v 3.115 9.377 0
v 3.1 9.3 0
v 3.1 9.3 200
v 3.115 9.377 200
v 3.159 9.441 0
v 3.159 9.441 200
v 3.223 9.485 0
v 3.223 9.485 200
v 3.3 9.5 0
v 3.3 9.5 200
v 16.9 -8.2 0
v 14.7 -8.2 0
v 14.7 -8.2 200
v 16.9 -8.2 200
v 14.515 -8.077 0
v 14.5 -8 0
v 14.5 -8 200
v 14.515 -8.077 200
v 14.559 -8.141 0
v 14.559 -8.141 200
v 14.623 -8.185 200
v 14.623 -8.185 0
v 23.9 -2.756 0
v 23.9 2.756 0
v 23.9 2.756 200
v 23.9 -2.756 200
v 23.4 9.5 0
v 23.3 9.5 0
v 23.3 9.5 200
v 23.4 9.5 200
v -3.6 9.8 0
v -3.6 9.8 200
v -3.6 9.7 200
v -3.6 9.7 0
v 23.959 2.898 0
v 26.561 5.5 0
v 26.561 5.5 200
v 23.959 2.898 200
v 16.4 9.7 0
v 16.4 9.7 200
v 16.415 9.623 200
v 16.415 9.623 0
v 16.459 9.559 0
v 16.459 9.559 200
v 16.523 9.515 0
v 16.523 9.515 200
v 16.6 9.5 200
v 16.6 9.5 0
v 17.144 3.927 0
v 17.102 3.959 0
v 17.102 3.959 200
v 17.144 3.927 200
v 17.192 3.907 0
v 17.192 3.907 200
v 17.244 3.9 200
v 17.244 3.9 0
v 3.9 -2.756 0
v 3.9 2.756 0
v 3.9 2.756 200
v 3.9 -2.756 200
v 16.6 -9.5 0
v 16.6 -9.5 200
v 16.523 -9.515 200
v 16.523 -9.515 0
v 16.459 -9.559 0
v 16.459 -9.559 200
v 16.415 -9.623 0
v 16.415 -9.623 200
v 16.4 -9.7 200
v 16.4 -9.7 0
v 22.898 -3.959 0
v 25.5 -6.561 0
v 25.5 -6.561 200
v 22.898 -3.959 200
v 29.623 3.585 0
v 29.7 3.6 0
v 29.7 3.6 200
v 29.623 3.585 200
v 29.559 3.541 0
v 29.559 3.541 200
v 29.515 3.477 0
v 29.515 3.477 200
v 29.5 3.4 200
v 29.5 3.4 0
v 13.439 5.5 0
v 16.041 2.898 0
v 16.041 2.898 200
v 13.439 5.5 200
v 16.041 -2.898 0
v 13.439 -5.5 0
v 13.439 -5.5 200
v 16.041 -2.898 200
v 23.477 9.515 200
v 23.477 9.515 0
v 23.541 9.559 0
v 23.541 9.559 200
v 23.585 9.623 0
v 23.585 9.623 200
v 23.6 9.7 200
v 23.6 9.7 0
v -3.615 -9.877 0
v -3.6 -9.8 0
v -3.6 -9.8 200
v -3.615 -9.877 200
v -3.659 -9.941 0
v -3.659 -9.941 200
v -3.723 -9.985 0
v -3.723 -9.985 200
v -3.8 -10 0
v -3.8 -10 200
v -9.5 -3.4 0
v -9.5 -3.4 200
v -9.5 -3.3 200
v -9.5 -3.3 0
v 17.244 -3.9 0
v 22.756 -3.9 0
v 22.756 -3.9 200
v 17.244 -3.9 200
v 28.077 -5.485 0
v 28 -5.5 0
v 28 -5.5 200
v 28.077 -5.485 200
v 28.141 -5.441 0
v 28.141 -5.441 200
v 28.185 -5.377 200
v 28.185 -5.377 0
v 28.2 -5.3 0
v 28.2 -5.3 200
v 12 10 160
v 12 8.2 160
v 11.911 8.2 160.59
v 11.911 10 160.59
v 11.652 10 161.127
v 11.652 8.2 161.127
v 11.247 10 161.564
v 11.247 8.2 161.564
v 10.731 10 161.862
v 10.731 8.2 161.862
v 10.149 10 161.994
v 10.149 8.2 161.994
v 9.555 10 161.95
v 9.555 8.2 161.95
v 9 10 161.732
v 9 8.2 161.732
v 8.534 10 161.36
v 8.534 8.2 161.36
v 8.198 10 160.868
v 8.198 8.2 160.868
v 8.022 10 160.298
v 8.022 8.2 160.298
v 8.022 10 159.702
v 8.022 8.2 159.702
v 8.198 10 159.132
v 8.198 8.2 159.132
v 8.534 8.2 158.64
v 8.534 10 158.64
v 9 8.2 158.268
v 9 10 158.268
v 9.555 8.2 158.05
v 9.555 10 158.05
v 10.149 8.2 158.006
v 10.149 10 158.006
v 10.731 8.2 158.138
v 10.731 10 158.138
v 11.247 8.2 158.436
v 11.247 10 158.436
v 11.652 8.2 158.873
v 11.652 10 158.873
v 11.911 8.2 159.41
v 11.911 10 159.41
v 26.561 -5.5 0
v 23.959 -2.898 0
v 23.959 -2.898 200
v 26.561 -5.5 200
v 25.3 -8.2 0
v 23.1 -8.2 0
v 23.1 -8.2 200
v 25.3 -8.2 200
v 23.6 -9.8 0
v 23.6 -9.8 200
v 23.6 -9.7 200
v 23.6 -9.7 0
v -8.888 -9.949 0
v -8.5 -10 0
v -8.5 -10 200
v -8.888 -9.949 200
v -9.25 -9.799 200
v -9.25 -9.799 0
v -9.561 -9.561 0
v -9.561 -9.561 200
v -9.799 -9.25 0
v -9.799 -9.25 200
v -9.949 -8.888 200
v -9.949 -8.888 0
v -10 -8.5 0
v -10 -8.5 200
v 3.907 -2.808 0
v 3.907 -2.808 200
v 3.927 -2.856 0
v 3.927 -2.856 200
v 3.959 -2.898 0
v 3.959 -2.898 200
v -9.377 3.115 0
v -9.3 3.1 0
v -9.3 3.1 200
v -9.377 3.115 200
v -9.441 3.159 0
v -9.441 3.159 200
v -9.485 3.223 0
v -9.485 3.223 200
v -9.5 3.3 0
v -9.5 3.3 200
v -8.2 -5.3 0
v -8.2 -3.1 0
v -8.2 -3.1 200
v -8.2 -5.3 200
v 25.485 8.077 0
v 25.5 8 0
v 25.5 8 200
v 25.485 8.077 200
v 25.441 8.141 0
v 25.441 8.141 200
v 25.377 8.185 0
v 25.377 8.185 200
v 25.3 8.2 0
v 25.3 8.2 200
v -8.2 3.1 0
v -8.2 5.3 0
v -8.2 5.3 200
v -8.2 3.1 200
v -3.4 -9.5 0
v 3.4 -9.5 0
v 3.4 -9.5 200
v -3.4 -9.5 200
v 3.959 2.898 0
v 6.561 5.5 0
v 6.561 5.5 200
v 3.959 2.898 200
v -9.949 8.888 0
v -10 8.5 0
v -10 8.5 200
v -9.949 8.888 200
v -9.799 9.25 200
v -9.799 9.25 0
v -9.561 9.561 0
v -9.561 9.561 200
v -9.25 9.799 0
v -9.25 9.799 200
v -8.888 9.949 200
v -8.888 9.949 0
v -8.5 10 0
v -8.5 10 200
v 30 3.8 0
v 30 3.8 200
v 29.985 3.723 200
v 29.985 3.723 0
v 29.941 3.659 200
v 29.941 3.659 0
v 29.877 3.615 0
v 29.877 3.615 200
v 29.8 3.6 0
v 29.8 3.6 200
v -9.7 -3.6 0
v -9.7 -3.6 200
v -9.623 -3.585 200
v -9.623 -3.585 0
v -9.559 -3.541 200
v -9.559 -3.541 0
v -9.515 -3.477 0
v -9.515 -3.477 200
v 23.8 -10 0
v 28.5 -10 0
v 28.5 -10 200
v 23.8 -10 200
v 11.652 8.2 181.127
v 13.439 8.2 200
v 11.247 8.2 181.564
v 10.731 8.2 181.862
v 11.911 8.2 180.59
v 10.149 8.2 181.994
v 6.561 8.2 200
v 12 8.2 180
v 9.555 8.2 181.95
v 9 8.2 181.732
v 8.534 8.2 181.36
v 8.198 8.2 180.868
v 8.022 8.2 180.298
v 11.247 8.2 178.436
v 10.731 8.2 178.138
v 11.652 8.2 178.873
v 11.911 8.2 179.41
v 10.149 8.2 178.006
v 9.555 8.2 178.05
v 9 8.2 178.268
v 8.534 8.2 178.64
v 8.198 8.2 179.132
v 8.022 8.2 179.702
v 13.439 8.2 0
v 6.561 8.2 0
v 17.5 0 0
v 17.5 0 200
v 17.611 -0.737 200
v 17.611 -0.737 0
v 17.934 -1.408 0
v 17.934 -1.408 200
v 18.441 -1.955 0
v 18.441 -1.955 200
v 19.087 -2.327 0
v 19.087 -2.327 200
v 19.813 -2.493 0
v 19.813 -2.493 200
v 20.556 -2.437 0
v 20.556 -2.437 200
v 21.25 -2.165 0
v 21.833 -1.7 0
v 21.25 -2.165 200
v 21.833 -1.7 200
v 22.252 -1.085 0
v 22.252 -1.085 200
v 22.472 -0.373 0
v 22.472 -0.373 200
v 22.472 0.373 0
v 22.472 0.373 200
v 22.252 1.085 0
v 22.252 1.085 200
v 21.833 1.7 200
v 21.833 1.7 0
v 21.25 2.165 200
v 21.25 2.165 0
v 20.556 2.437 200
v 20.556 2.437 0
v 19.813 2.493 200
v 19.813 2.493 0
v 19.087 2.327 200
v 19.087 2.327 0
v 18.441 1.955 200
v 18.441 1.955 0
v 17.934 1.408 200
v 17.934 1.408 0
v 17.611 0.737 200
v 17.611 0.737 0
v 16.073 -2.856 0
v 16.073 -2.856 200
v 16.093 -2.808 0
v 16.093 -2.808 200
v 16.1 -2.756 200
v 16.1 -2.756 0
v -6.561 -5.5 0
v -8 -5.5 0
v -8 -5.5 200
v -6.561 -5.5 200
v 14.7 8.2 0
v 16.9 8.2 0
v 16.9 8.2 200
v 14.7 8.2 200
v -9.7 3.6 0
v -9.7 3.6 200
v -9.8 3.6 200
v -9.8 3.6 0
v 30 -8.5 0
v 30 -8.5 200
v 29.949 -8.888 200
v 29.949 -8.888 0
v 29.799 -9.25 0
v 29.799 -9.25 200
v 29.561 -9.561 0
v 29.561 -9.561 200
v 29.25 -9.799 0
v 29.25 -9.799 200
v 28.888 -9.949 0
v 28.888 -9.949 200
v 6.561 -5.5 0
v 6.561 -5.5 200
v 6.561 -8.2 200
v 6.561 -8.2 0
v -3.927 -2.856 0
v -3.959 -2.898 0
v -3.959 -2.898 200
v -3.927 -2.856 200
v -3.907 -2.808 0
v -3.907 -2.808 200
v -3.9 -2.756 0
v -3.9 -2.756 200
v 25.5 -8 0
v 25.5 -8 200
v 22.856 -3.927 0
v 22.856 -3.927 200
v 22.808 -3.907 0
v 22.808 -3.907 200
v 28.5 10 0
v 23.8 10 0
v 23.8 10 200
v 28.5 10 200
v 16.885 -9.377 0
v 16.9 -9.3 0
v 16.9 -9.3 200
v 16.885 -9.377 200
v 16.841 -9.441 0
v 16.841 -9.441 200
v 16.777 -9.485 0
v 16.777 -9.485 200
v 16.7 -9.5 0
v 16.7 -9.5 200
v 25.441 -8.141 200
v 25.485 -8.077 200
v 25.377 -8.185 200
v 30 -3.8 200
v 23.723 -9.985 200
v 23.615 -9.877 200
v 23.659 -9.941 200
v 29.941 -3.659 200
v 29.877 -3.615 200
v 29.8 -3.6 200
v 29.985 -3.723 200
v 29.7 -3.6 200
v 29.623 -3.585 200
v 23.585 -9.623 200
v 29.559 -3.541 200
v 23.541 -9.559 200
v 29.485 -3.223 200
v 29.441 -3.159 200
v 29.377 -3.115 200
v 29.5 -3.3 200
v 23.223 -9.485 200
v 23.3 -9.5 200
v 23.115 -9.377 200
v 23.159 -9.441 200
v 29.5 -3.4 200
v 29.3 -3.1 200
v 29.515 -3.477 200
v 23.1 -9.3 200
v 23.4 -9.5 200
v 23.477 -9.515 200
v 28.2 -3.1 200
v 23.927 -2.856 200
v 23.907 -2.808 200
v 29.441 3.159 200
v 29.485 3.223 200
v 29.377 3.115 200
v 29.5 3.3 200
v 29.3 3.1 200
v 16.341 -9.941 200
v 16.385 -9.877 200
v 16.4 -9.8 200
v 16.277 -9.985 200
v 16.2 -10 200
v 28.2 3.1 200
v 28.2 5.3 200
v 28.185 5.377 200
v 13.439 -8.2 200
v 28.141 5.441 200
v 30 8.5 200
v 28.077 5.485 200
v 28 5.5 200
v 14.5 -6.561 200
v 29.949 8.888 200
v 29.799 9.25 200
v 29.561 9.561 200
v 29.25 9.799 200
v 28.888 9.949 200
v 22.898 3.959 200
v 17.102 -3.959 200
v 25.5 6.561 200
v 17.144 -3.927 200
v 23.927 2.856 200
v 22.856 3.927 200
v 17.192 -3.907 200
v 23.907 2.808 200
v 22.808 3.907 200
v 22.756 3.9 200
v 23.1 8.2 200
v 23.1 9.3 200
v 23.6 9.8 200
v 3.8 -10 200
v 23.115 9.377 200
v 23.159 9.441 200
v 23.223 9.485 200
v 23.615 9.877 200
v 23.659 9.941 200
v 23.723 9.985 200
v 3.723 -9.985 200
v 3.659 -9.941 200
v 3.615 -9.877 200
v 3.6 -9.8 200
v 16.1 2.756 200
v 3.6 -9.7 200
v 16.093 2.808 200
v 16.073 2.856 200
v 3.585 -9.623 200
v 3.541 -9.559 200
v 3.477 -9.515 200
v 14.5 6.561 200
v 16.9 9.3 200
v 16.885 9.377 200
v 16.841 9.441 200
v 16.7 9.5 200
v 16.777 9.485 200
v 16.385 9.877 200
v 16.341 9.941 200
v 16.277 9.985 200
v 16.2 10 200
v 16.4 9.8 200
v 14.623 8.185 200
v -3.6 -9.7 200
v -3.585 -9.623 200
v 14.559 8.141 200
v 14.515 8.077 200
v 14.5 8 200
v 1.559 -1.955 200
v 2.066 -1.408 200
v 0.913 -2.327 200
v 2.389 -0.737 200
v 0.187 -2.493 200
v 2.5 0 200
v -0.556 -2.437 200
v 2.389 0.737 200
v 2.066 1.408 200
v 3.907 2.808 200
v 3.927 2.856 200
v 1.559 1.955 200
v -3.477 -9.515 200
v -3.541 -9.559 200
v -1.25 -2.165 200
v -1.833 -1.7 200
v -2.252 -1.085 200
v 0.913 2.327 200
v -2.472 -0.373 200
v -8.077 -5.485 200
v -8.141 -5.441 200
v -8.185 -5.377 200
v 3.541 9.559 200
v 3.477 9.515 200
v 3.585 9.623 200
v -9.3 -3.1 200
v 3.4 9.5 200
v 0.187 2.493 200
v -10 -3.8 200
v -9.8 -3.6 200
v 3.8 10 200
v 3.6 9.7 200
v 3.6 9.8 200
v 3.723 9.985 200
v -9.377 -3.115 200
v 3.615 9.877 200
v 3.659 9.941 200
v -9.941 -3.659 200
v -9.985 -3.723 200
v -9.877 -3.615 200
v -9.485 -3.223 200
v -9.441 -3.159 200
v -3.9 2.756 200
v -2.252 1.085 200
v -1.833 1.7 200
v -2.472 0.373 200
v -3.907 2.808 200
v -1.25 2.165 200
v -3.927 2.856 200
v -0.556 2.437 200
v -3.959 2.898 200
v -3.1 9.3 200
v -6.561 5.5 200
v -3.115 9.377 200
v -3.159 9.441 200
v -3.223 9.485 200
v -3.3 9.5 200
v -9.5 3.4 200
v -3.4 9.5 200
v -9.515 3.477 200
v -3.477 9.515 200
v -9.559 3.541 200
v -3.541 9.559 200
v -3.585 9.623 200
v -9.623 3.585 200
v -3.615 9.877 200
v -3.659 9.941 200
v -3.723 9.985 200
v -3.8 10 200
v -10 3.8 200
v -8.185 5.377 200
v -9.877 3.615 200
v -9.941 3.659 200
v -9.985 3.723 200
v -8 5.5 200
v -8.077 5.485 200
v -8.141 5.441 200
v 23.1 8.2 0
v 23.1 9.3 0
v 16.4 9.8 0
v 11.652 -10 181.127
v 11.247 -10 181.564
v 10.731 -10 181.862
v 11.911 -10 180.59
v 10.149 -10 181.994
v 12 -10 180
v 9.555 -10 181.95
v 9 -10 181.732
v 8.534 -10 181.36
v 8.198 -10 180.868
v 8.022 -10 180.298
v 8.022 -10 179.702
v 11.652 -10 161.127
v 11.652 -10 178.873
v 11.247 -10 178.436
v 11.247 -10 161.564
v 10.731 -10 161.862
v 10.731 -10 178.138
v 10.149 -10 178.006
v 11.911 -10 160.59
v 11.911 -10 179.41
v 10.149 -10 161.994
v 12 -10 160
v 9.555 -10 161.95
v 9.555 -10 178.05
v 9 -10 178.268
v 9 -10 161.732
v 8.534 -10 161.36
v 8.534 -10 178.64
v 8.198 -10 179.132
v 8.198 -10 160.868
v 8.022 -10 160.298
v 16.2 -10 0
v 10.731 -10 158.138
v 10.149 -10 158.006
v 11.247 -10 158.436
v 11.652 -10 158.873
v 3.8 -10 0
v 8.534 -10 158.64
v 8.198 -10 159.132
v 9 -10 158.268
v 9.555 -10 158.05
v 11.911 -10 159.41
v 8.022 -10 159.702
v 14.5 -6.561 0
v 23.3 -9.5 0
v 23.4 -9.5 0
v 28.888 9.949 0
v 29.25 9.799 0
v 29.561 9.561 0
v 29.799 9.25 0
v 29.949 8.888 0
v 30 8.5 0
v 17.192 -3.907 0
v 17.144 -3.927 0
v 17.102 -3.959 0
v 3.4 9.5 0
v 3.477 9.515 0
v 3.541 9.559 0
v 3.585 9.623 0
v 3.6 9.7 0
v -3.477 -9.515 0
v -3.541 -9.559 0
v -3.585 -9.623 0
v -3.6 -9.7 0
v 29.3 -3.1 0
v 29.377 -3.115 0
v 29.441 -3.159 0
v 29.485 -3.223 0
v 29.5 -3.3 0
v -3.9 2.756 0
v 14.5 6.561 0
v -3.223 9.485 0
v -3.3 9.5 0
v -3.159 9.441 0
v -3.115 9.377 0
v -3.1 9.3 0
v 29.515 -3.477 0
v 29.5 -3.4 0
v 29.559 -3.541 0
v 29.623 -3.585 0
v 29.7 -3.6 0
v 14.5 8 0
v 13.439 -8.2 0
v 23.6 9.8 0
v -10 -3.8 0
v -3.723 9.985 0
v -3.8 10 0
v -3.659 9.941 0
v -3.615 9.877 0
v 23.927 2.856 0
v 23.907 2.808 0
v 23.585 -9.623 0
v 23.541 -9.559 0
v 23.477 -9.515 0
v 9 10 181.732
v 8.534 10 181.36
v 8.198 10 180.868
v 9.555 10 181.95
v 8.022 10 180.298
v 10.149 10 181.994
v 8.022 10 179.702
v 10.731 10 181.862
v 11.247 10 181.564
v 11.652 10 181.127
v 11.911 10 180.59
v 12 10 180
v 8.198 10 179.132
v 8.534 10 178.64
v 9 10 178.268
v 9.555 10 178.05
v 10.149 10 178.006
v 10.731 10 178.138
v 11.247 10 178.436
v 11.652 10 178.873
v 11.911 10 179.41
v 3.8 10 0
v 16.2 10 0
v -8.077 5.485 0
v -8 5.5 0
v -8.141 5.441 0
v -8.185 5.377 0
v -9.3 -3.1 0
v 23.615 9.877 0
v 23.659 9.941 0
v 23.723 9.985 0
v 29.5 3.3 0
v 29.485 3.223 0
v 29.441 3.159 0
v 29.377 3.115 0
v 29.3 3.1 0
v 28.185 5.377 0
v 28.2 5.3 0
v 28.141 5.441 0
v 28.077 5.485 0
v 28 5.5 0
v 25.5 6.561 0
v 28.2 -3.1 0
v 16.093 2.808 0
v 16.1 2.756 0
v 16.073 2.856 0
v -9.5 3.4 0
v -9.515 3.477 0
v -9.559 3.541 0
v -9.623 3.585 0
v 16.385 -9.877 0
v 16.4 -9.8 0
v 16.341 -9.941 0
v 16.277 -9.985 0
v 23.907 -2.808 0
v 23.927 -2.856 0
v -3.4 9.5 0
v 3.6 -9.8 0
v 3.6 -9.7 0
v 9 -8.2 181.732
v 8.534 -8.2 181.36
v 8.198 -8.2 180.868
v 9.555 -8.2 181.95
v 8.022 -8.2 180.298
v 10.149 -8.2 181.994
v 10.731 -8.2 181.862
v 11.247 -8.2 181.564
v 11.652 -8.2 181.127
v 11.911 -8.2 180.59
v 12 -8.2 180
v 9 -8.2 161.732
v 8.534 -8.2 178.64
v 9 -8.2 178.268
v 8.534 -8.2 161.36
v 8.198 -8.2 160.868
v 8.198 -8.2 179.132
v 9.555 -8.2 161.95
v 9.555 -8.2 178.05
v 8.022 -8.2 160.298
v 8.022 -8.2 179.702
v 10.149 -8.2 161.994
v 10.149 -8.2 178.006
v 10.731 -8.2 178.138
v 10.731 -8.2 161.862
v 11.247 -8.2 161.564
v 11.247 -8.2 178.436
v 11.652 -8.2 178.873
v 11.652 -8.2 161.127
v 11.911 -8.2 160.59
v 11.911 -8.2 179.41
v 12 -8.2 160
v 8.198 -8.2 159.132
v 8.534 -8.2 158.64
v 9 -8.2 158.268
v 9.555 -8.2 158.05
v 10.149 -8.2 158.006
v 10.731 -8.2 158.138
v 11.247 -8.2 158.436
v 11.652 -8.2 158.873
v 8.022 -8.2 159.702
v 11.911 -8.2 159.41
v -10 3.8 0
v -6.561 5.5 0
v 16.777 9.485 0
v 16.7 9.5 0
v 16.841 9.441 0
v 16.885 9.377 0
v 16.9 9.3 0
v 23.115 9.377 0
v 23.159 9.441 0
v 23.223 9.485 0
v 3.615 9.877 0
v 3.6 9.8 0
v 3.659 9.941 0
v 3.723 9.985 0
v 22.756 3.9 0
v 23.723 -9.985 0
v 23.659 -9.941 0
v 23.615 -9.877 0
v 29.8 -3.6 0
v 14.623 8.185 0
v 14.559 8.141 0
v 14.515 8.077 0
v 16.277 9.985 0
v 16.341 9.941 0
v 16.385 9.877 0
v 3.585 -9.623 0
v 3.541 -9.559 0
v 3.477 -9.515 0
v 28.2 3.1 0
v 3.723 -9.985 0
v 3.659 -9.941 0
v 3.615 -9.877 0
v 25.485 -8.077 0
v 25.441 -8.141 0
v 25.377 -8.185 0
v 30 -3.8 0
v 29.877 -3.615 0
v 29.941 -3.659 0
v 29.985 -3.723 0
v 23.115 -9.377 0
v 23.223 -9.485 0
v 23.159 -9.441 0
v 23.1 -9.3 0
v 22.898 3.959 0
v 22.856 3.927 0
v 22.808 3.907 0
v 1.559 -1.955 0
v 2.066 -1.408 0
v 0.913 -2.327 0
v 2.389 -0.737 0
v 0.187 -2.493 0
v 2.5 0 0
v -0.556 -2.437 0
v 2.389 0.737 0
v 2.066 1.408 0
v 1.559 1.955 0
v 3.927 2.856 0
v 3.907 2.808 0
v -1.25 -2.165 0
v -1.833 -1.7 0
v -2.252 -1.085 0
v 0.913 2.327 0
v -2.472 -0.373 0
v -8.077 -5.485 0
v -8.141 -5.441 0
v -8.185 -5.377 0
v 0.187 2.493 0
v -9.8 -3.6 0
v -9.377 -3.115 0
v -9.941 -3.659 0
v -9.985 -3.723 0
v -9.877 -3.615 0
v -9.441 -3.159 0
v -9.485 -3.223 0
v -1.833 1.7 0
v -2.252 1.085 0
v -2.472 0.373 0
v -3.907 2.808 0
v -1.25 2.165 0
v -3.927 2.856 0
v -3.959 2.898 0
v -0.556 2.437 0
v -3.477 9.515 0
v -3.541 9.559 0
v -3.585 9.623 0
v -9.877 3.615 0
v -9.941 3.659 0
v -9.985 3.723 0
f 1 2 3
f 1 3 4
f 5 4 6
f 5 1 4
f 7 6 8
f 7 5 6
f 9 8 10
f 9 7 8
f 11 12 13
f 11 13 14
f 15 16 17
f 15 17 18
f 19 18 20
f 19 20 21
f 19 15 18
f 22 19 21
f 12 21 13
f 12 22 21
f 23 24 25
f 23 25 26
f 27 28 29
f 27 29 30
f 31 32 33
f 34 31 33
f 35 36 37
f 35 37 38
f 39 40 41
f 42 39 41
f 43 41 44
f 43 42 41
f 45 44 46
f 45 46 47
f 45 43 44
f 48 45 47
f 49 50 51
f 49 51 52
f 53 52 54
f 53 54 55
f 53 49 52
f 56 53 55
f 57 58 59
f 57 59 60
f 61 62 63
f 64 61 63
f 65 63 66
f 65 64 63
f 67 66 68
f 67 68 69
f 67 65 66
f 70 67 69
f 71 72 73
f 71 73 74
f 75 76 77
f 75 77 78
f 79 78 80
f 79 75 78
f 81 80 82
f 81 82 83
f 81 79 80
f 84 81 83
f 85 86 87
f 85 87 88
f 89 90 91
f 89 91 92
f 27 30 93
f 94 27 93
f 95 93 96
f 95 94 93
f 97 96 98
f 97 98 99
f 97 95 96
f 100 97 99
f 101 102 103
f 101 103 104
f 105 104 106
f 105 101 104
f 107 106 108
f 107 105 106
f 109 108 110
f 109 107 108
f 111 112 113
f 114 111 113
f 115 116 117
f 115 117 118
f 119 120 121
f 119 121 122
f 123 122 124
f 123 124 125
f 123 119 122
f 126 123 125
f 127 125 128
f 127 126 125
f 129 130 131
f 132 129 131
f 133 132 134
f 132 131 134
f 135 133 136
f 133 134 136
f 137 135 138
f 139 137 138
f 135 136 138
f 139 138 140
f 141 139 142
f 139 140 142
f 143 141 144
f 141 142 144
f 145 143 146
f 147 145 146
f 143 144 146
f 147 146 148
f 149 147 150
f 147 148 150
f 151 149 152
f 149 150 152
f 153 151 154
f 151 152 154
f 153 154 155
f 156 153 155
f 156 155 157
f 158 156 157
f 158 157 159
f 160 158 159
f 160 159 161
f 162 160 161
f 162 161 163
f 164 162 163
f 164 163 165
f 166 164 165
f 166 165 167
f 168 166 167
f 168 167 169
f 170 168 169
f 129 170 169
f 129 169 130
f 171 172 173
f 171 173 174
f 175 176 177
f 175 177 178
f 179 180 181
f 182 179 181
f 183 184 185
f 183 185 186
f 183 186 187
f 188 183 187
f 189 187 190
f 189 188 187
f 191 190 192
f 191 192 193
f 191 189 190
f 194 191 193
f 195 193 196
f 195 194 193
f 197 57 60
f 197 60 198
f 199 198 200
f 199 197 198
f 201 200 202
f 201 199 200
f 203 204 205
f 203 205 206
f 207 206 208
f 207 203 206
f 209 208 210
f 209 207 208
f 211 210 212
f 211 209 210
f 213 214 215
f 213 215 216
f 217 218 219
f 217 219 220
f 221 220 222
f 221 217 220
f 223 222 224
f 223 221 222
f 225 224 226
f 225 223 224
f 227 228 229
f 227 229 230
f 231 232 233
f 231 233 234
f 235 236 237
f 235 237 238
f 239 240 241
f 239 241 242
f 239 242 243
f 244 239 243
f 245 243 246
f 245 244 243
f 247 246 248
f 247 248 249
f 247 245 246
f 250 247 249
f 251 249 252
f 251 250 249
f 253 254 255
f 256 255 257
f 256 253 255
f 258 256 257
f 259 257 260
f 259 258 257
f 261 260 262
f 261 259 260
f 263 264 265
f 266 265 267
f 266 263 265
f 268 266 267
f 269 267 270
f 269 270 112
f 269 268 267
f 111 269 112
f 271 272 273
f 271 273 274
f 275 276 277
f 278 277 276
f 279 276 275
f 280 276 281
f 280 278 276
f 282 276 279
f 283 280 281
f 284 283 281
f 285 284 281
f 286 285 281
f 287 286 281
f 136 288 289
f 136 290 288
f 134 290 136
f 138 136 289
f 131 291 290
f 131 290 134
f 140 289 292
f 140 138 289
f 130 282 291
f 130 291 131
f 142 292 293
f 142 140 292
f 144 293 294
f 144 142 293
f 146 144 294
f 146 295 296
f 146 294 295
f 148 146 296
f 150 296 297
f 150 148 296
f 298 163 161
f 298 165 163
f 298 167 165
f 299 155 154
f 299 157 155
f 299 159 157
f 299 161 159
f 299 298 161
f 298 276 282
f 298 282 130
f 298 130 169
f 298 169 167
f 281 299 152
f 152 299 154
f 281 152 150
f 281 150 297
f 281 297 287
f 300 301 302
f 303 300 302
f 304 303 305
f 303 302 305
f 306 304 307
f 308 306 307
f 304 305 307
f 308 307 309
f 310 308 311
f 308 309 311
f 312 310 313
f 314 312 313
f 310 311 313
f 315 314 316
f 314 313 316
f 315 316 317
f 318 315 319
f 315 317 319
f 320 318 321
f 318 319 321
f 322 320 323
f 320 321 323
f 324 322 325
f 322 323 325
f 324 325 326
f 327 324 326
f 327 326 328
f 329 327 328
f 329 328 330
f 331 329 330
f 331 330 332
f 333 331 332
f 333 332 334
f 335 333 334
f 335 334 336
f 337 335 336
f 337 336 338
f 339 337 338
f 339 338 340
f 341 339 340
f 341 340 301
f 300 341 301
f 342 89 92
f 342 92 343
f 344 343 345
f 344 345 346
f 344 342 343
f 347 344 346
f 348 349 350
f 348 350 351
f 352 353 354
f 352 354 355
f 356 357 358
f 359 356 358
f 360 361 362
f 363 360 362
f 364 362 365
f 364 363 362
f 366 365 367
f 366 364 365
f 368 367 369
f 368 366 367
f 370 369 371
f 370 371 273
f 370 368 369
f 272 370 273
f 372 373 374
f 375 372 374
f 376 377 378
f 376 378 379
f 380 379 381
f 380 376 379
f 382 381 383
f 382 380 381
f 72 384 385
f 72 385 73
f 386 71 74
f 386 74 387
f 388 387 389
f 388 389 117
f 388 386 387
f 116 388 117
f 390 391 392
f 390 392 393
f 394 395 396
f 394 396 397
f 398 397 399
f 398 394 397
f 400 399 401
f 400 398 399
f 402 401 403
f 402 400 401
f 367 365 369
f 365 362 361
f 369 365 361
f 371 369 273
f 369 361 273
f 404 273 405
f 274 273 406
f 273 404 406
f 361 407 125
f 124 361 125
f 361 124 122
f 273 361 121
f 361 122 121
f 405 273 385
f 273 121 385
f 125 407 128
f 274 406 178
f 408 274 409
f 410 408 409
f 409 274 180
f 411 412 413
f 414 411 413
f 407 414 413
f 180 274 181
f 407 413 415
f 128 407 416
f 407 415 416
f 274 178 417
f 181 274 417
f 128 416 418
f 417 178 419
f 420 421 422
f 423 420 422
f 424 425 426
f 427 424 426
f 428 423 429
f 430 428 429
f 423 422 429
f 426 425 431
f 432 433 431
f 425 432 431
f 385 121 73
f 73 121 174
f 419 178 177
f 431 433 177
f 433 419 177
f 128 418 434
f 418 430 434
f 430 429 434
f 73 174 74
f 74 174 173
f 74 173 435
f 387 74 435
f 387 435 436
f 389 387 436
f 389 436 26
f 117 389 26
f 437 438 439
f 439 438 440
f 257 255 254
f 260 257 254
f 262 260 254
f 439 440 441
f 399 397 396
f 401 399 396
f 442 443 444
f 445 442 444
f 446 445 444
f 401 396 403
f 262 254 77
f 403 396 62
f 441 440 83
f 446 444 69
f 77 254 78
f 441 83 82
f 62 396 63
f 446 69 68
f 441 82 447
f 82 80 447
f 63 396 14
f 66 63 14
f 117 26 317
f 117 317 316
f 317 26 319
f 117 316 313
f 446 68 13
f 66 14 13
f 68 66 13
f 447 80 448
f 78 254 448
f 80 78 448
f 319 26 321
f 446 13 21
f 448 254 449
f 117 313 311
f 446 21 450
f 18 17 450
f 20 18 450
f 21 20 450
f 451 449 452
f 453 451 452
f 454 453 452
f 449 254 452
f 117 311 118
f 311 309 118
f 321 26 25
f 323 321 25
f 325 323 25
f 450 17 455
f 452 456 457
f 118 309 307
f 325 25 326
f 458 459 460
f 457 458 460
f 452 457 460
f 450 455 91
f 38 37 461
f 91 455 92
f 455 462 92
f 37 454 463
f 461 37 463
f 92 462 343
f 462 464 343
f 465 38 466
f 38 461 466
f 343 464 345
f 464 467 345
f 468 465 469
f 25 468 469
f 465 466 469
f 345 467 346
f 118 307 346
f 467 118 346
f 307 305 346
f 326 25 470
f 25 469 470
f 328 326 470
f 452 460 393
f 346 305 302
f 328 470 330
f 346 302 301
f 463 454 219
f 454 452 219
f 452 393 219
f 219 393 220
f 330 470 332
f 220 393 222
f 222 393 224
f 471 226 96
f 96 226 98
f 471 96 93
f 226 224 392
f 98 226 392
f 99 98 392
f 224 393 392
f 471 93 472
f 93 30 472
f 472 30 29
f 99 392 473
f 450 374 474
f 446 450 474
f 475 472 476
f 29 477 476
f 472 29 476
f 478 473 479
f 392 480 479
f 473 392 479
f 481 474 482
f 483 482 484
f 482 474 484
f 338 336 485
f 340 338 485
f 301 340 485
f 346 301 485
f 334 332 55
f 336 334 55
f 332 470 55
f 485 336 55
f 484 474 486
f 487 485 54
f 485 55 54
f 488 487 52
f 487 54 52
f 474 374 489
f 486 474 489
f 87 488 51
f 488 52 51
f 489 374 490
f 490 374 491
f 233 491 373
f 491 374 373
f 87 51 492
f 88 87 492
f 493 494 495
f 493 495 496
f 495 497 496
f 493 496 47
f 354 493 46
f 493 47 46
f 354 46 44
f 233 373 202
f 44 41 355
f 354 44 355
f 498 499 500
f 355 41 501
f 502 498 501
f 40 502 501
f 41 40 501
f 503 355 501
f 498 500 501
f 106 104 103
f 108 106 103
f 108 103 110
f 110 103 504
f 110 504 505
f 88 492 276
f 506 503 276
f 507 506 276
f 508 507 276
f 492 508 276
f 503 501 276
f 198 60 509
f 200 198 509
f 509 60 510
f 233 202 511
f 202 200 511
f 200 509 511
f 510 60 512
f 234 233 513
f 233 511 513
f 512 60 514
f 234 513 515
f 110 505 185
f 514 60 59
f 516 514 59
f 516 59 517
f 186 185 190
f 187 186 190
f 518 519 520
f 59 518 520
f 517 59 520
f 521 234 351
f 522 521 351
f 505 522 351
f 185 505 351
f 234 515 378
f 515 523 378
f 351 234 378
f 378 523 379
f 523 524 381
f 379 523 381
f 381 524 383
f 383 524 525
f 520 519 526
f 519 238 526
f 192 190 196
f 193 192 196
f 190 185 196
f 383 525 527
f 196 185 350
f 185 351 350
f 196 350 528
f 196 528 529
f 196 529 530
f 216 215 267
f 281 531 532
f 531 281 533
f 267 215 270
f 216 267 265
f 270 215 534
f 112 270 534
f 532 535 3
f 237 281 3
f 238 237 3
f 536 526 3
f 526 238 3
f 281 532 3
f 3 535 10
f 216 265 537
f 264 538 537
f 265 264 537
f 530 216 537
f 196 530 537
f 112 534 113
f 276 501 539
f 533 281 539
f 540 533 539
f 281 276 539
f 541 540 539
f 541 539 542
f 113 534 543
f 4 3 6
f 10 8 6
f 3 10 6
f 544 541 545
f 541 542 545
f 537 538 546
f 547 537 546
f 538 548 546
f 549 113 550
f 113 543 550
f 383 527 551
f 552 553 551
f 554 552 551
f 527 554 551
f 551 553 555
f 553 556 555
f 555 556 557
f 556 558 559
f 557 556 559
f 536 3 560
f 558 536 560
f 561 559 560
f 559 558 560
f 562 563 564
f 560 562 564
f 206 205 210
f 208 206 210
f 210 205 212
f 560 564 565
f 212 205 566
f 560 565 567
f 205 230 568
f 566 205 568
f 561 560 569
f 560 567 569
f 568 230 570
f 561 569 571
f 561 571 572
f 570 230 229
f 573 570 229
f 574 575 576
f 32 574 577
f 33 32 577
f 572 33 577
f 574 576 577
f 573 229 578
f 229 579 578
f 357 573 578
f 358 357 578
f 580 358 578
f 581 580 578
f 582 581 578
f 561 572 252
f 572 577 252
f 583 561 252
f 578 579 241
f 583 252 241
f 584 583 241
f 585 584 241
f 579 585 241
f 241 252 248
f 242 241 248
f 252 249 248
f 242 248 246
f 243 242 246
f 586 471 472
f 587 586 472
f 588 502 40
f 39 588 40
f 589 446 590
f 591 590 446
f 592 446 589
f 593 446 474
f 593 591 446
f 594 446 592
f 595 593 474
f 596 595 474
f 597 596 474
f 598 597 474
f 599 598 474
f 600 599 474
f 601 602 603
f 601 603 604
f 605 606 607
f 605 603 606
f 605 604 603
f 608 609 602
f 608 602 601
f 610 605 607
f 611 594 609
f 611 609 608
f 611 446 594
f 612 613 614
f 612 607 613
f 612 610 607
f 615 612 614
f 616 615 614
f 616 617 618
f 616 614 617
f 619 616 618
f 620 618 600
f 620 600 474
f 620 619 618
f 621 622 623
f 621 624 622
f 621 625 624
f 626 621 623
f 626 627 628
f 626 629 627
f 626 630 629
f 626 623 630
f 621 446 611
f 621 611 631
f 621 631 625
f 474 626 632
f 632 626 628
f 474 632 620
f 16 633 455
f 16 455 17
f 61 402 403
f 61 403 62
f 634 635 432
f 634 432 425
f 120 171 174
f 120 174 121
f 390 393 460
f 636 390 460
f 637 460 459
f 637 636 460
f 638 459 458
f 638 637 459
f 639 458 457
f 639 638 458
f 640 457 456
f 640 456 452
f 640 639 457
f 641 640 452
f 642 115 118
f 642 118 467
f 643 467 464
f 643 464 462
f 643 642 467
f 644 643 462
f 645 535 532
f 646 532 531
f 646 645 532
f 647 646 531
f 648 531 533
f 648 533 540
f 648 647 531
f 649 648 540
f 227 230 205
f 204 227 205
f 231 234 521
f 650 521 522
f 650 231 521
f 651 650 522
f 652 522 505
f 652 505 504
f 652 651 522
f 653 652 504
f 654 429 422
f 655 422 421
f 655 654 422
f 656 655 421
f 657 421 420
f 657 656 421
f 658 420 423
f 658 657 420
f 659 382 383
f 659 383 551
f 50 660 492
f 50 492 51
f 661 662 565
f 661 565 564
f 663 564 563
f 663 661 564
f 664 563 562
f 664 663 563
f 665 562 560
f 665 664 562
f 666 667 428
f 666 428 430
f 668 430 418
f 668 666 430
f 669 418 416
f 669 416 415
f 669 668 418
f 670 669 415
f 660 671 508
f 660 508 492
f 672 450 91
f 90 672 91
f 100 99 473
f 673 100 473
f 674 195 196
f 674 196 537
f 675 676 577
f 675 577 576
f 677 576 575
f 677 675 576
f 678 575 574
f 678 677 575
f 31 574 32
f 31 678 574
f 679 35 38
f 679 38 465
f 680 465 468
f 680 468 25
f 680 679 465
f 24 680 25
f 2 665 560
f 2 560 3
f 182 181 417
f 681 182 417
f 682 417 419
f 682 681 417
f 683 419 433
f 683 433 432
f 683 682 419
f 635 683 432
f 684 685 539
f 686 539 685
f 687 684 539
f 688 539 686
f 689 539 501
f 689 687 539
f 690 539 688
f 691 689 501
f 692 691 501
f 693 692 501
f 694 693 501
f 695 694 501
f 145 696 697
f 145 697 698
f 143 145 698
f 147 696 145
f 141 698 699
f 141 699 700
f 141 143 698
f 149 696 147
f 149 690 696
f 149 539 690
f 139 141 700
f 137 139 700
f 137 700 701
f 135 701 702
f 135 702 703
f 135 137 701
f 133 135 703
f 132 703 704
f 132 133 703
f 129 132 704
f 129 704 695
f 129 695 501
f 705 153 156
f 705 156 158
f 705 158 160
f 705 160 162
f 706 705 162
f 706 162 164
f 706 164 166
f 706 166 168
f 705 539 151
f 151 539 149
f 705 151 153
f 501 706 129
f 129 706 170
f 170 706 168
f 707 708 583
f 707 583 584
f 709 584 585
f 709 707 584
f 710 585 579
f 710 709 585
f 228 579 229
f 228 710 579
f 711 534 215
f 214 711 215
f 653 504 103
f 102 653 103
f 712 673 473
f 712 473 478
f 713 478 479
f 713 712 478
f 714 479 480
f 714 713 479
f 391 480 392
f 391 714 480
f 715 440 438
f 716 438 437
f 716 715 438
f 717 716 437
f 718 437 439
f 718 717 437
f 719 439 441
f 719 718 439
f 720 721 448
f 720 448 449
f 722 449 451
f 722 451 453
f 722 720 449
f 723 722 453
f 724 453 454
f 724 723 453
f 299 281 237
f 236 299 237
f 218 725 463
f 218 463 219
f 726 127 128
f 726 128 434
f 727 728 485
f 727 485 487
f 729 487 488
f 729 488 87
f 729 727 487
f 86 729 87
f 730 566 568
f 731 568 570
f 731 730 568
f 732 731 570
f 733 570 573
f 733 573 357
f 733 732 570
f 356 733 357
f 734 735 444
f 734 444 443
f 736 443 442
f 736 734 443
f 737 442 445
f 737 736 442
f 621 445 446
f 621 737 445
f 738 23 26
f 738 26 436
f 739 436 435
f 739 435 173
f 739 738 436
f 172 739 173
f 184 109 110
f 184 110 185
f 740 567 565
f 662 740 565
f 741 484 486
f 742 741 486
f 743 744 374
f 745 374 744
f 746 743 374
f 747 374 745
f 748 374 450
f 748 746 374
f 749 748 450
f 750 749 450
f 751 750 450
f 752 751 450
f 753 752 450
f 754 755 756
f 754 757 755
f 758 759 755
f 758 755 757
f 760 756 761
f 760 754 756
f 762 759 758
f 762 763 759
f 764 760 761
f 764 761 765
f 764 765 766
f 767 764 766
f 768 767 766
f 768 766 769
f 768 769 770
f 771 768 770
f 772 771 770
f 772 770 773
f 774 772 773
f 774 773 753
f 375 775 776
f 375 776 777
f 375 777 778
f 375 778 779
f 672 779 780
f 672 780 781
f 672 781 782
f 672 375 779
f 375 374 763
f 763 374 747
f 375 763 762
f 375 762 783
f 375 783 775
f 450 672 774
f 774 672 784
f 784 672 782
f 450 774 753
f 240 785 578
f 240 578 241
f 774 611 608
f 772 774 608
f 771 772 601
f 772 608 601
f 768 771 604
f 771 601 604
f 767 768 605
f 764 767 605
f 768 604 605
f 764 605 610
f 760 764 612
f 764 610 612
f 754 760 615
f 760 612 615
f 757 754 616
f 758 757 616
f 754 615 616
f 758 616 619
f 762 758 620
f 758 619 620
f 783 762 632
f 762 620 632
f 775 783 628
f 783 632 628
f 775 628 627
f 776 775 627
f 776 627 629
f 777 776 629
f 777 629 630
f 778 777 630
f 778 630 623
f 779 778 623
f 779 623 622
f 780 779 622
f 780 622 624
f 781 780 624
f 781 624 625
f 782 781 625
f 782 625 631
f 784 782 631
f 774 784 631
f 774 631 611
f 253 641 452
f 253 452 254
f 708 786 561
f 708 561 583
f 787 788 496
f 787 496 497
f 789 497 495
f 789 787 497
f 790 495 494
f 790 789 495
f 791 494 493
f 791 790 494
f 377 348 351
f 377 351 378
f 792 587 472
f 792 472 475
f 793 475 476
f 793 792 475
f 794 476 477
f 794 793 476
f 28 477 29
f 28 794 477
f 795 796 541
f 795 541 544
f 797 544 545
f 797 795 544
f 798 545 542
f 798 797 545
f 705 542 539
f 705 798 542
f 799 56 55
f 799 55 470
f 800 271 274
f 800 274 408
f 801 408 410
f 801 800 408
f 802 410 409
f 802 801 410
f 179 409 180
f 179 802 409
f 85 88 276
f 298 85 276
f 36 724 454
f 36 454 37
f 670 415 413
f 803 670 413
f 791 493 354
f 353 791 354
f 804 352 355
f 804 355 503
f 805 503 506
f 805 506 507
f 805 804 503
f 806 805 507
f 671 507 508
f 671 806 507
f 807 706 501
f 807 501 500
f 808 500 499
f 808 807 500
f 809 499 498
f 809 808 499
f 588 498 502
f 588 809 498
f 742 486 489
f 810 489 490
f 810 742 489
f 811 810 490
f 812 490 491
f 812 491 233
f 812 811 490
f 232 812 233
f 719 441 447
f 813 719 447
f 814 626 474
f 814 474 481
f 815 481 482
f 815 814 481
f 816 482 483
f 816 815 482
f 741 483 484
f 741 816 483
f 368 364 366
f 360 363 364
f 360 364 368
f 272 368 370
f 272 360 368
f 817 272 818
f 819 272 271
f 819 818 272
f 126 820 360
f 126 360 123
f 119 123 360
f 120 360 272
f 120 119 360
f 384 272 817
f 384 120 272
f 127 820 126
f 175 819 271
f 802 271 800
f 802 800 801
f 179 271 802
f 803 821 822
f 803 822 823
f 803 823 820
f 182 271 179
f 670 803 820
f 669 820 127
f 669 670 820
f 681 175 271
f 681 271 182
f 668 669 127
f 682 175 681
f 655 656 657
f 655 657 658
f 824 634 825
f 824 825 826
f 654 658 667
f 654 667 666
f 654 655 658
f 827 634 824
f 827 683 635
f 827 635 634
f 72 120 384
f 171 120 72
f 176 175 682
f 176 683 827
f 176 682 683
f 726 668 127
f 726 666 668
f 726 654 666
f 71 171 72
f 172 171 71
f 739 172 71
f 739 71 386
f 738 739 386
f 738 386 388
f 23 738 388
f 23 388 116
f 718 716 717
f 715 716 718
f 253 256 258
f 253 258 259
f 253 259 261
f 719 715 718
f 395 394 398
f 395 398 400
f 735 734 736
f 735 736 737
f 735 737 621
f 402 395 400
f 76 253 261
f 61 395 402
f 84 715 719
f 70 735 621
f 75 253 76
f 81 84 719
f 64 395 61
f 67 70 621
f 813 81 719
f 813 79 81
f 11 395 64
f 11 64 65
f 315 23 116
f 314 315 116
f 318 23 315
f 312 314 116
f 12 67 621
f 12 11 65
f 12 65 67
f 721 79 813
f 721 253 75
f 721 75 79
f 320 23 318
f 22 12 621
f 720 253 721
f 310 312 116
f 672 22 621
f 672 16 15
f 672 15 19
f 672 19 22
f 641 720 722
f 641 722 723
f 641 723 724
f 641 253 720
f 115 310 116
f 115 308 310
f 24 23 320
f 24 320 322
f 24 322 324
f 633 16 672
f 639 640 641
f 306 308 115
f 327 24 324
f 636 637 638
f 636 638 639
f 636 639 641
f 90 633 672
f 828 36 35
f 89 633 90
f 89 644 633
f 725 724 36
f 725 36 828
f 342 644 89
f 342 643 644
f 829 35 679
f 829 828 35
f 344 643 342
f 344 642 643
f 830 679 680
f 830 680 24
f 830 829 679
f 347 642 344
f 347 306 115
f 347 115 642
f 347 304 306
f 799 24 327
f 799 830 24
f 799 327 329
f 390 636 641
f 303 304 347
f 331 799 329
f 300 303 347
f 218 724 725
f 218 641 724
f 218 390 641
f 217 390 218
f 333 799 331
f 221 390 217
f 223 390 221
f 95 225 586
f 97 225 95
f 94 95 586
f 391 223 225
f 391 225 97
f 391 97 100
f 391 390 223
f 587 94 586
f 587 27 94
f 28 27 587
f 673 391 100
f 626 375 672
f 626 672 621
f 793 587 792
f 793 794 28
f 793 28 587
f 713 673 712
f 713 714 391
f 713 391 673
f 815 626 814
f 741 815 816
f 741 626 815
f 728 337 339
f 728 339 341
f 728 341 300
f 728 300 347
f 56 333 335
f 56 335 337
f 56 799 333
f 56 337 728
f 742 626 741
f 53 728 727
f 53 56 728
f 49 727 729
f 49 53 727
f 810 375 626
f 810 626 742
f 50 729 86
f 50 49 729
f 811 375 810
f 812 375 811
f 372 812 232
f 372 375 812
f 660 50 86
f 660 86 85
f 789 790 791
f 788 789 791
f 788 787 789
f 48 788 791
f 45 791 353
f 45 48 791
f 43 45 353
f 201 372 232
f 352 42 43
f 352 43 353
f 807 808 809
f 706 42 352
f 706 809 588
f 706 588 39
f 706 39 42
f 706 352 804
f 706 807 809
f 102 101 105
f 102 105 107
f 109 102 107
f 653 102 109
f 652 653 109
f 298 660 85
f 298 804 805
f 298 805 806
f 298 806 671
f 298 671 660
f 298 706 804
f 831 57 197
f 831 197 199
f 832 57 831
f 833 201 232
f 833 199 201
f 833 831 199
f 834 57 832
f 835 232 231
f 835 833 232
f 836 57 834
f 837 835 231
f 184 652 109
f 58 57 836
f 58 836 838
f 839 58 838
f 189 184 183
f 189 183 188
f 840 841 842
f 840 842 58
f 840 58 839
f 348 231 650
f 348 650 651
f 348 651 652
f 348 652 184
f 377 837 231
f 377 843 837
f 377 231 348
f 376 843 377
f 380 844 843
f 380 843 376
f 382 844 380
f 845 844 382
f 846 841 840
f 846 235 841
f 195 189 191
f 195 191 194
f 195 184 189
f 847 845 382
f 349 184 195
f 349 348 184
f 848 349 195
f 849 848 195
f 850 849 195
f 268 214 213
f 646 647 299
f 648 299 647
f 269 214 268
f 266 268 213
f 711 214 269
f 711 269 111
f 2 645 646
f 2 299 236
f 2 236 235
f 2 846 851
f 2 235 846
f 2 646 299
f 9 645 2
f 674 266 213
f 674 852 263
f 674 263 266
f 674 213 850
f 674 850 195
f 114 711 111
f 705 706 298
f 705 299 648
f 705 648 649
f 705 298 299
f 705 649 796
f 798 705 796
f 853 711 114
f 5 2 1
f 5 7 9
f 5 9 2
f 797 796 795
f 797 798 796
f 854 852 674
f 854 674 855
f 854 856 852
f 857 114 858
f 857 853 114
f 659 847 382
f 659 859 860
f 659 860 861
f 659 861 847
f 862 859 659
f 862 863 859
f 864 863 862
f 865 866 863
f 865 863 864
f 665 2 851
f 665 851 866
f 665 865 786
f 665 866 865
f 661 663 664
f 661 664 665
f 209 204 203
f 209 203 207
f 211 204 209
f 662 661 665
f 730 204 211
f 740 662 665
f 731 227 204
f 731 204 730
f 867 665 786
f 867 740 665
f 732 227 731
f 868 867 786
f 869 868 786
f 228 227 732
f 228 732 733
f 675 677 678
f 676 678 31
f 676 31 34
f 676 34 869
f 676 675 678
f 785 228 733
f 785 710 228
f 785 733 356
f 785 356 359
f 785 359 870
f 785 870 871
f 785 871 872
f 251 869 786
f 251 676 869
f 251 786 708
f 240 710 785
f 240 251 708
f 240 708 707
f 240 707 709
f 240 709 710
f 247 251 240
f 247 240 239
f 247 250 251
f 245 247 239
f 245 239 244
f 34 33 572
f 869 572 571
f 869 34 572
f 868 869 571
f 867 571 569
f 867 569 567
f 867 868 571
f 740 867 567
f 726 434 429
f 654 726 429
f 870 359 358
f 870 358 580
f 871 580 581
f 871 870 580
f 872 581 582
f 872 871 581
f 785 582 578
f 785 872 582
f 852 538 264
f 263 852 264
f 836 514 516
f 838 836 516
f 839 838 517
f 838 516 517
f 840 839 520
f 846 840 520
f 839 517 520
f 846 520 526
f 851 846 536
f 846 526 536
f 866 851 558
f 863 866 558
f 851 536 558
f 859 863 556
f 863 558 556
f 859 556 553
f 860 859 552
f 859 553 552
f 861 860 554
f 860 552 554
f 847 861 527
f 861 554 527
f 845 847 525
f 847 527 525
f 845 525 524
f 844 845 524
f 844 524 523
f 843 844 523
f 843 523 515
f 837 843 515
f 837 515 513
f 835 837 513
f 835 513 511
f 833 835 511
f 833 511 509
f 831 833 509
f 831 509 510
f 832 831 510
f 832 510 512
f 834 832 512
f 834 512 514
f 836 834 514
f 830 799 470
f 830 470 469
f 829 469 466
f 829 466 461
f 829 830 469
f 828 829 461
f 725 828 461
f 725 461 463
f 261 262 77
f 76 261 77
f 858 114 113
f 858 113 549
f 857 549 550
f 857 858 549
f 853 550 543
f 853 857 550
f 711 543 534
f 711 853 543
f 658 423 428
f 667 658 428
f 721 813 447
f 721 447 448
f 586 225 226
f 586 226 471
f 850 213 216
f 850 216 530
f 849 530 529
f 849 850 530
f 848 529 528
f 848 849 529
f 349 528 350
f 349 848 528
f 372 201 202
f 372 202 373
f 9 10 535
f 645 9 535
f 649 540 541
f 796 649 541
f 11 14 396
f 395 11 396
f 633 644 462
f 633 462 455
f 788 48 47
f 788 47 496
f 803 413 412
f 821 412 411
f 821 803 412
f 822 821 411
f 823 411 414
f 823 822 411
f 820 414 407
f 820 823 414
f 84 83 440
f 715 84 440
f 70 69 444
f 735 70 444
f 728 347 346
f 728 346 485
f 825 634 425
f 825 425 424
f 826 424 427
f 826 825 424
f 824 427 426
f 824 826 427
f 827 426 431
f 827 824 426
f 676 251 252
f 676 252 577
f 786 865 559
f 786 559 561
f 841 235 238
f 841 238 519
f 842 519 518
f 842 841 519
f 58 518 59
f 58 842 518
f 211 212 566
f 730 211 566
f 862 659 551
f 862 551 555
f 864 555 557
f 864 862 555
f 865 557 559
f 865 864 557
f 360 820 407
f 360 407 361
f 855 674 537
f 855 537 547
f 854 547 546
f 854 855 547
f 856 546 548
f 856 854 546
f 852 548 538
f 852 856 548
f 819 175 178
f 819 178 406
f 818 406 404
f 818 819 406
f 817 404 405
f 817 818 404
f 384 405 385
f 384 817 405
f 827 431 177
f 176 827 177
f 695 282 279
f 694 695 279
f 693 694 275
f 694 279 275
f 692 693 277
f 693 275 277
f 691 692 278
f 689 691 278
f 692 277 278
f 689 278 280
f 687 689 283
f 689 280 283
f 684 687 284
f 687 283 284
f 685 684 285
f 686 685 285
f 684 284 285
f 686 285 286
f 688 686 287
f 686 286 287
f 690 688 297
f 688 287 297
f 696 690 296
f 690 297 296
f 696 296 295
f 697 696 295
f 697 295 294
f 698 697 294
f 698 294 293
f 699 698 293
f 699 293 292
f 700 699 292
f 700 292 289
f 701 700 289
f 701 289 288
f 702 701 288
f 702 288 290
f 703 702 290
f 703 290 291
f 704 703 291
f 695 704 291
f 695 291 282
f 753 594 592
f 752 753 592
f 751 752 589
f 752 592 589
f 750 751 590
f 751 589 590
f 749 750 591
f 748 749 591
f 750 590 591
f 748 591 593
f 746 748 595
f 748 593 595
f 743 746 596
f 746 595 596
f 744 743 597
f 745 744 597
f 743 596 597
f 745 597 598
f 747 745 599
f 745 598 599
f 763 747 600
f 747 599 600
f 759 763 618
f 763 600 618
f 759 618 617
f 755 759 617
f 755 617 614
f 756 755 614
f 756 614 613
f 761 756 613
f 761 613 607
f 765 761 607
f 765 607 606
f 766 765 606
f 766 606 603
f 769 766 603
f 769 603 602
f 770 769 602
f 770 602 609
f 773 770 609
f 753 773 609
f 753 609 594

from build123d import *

# Parameters (mm, degrees)
BOSS_EXTRUDE1_DEPTH = 200
SKETCH2_R           = 2.5
CUT_EXTRUDE1_DEPTH  = 203.484567313
SKETCH3_R           = 2
CUT_EXTRUDE2_DEPTH  = 40


with BuildPart() as part:
    # Sketch1 → Boss-Extrude1 (new body)
    with BuildSketch(Plane.XY):
        with BuildLine():
            Line((-8.5, 10), (-3.8, 10))
            ThreePointArc((-3.8, 10), (-3.658578644, 9.941421356), (-3.6, 9.8))
            Line((-3.6, 9.8), (-3.6, 9.7))
            ThreePointArc((-3.6, 9.7), (-3.541421356, 9.558578644), (-3.4, 9.5))
            Line((-3.4, 9.5), (-3.3, 9.5))
            ThreePointArc((-3.3, 9.5), (-3.158578644, 9.441421356), (-3.1, 9.3))
            Line((-3.1, 9.3), (3.1, 9.3))
            ThreePointArc((3.1, 9.3), (3.158578644, 9.441421356), (3.3, 9.5))
            Line((3.3, 9.5), (3.4, 9.5))
            ThreePointArc((3.4, 9.5), (3.541421356, 9.558578644), (3.6, 9.7))
            Line((3.6, 9.7), (3.6, 9.8))
            ThreePointArc((3.6, 9.8), (3.658578644, 9.941421356), (3.8, 10))
            Line((3.8, 10), (8.5, 10))
            Line((8.5, 10), (11.5, 10))
            Line((11.5, 10), (16.2, 10))
            ThreePointArc((16.2, 10), (16.341421356, 9.941421356), (16.4, 9.8))
            Line((16.4, 9.8), (16.4, 9.7))
            ThreePointArc((16.4, 9.7), (16.458578644, 9.558578644), (16.6, 9.5))
            Line((16.6, 9.5), (16.7, 9.5))
            ThreePointArc((16.7, 9.5), (16.841421356, 9.441421356), (16.9, 9.3))
            Line((16.9, 9.3), (16.9, 8.2))
            Line((16.9, 8.2), (14.7, 8.2))
            ThreePointArc((14.7, 8.2), (14.558578644, 8.141421356), (14.5, 8))
            Line((14.5, 8), (14.5, 6.560660172))
            Line((14.5, 6.560660172), (17.102081528, 3.958578644))
            ThreePointArc((17.102081528, 3.958578644), (17.166966198, 3.915224093), (17.243502884, 3.9))
            Line((17.243502884, 3.9), (22.756497116, 3.9))
            ThreePointArc((22.756497116, 3.9), (22.833033802, 3.915224093), (22.897918472, 3.958578644))
            Line((22.897918472, 3.958578644), (25.5, 6.560660172))
            Line((25.5, 6.560660172), (25.5, 8))
            ThreePointArc((25.5, 8), (25.441421356, 8.141421356), (25.3, 8.2))
            Line((25.3, 8.2), (23.1, 8.2))
            Line((23.1, 8.2), (23.1, 9.3))
            ThreePointArc((23.1, 9.3), (23.158578644, 9.441421356), (23.3, 9.5))
            Line((23.3, 9.5), (23.4, 9.5))
            ThreePointArc((23.4, 9.5), (23.541421356, 9.558578644), (23.6, 9.7))
            Line((23.6, 9.7), (23.6, 9.8))
            ThreePointArc((23.6, 9.8), (23.658578644, 9.941421356), (23.8, 10))
            Line((23.8, 10), (28.5, 10))
            ThreePointArc((28.5, 10), (29.560660172, 9.560660172), (30, 8.5))
            Line((30, 8.5), (30, 3.8))
            ThreePointArc((30, 3.8), (29.941421356, 3.658578644), (29.8, 3.6))
            Line((29.8, 3.6), (29.7, 3.6))
            ThreePointArc((29.7, 3.6), (29.558578644, 3.541421356), (29.5, 3.4))
            Line((29.5, 3.4), (29.5, 3.3))
            ThreePointArc((29.5, 3.3), (29.441421356, 3.158578644), (29.3, 3.1))
            Line((29.3, 3.1), (28.2, 3.1))
            Line((28.2, 3.1), (28.2, 5.3))
            ThreePointArc((28.2, 5.3), (28.141421356, 5.441421356), (28, 5.5))
            Line((28, 5.5), (26.560660172, 5.5))
            Line((26.560660172, 5.5), (23.958578644, 2.897918472))
            ThreePointArc((23.958578644, 2.897918472), (23.915224093, 2.833033802), (23.9, 2.756497116))
            Line((23.9, 2.756497116), (23.9, -2.756497116))
            ThreePointArc((23.9, -2.756497116), (23.915224093, -2.833033802), (23.958578644, -2.897918472))
            Line((23.958578644, -2.897918472), (26.560660172, -5.5))
            Line((26.560660172, -5.5), (28, -5.5))
            ThreePointArc((28, -5.5), (28.141421356, -5.441421356), (28.2, -5.3))
            Line((28.2, -5.3), (28.2, -3.1))
            Line((28.2, -3.1), (29.3, -3.1))
            ThreePointArc((29.3, -3.1), (29.441421356, -3.158578644), (29.5, -3.3))
            Line((29.5, -3.3), (29.5, -3.4))
            ThreePointArc((29.5, -3.4), (29.558578644, -3.541421356), (29.7, -3.6))
            Line((29.7, -3.6), (29.8, -3.6))
            ThreePointArc((29.8, -3.6), (29.941421356, -3.658578644), (30, -3.8))
            Line((30, -3.8), (30, -8.5))
            ThreePointArc((30, -8.5), (29.560660172, -9.560660172), (28.5, -10))
            Line((28.5, -10), (23.8, -10))
            ThreePointArc((23.8, -10), (23.658578644, -9.941421356), (23.6, -9.8))
            Line((23.6, -9.8), (23.6, -9.7))
            ThreePointArc((23.6, -9.7), (23.541421356, -9.558578644), (23.4, -9.5))
            Line((23.4, -9.5), (23.3, -9.5))
            ThreePointArc((23.3, -9.5), (23.158578644, -9.441421356), (23.1, -9.3))
            Line((23.1, -9.3), (23.1, -8.2))
            Line((23.1, -8.2), (25.3, -8.2))
            ThreePointArc((25.3, -8.2), (25.441421356, -8.141421356), (25.5, -8))
            Line((25.5, -8), (25.5, -6.560660172))
            Line((25.5, -6.560660172), (22.897918472, -3.958578644))
            ThreePointArc((22.897918472, -3.958578644), (22.833033802, -3.915224093), (22.756497116, -3.9))
            Line((22.756497116, -3.9), (17.243502884, -3.9))
            ThreePointArc((17.243502884, -3.9), (17.166966198, -3.915224093), (17.102081528, -3.958578644))
            Line((17.102081528, -3.958578644), (14.5, -6.560660172))
            Line((14.5, -6.560660172), (14.5, -8))
            ThreePointArc((14.5, -8), (14.558578644, -8.141421356), (14.7, -8.2))
            Line((14.7, -8.2), (16.9, -8.2))
            Line((16.9, -8.2), (16.9, -9.3))
            ThreePointArc((16.9, -9.3), (16.841421356, -9.441421356), (16.7, -9.5))
            Line((16.7, -9.5), (16.6, -9.5))
            ThreePointArc((16.6, -9.5), (16.458578644, -9.558578644), (16.4, -9.7))
            Line((16.4, -9.7), (16.4, -9.8))
            ThreePointArc((16.4, -9.8), (16.341421356, -9.941421356), (16.2, -10))
            Line((16.2, -10), (11.5, -10))
            Line((11.5, -10), (8.5, -10))
            Line((8.5, -10), (3.8, -10))
            ThreePointArc((3.8, -10), (3.658578644, -9.941421356), (3.6, -9.8))
            Line((3.6, -9.8), (3.6, -9.7))
            ThreePointArc((3.6, -9.7), (3.541421356, -9.558578644), (3.4, -9.5))
            Line((3.4, -9.5), (3.3, -9.5))
            Line((3.3, -9.5), (-3.3, -9.5))
            Line((-3.3, -9.5), (-3.4, -9.5))
            ThreePointArc((-3.4, -9.5), (-3.541421356, -9.558578644), (-3.6, -9.7))
            Line((-3.6, -9.7), (-3.6, -9.8))
            ThreePointArc((-3.6, -9.8), (-3.658578644, -9.941421356), (-3.8, -10))
            Line((-3.8, -10), (-8.5, -10))
            ThreePointArc((-8.5, -10), (-9.560660172, -9.560660172), (-10, -8.5))
            Line((-10, -8.5), (-10, -3.8))
            ThreePointArc((-10, -3.8), (-9.941421356, -3.658578644), (-9.8, -3.6))
            Line((-9.8, -3.6), (-9.7, -3.6))
            ThreePointArc((-9.7, -3.6), (-9.558578644, -3.541421356), (-9.5, -3.4))
            Line((-9.5, -3.4), (-9.5, -3.3))
            ThreePointArc((-9.5, -3.3), (-9.441421356, -3.158578644), (-9.3, -3.1))
            Line((-9.3, -3.1), (-8.2, -3.1))
            Line((-8.2, -3.1), (-8.2, -5.3))
            ThreePointArc((-8.2, -5.3), (-8.141421356, -5.441421356), (-8, -5.5))
            Line((-8, -5.5), (-6.560660172, -5.5))
            Line((-6.560660172, -5.5), (-3.958578644, -2.897918472))
            ThreePointArc((-3.958578644, -2.897918472), (-3.915224093, -2.833033802), (-3.9, -2.756497116))
            Line((-3.9, -2.756497116), (-3.9, 2.756497116))
            ThreePointArc((-3.9, 2.756497116), (-3.915224093, 2.833033802), (-3.958578644, 2.897918472))
            Line((-3.958578644, 2.897918472), (-6.560660172, 5.5))
            Line((-6.560660172, 5.5), (-8, 5.5))
            ThreePointArc((-8, 5.5), (-8.141421356, 5.441421356), (-8.2, 5.3))
            Line((-8.2, 5.3), (-8.2, 3.1))
            Line((-8.2, 3.1), (-9.3, 3.1))
            ThreePointArc((-9.3, 3.1), (-9.441421356, 3.158578644), (-9.5, 3.3))
            Line((-9.5, 3.3), (-9.5, 3.4))
            ThreePointArc((-9.5, 3.4), (-9.558578644, 3.541421356), (-9.7, 3.6))
            Line((-9.7, 3.6), (-9.8, 3.6))
            ThreePointArc((-9.8, 3.6), (-9.941421356, 3.658578644), (-10, 3.8))
            Line((-10, 3.8), (-10, 8.5))
            ThreePointArc((-10, 8.5), (-9.560660172, 9.560660172), (-8.5, 10))
        make_face()
        with BuildLine():
            Line((3.9, 2.756497116), (3.9, -2.756497116))
            ThreePointArc((3.9, -2.756497116), (3.915224093, -2.833033802), (3.958578644, -2.897918472))
            Line((3.958578644, -2.897918472), (6.560660172, -5.5))
            Line((6.560660172, -5.5), (6.560660172, -8.2))
            Line((6.560660172, -8.2), (13.439339828, -8.2))
            Line((13.439339828, -8.2), (13.439339828, -5.5))
            Line((13.439339828, -5.5), (16.041421356, -2.897918472))
            ThreePointArc((16.041421356, -2.897918472), (16.084775907, -2.833033802), (16.1, -2.756497116))
            Line((16.1, -2.756497116), (16.1, 2.756497116))
            ThreePointArc((16.1, 2.756497116), (16.084775907, 2.833033802), (16.041421356, 2.897918472))
            Line((16.041421356, 2.897918472), (13.439339828, 5.5))
            Line((13.439339828, 5.5), (13.439339828, 8.2))
            Line((13.439339828, 8.2), (6.560660172, 8.2))
            Line((6.560660172, 8.2), (6.560660172, 5.5))
            Line((6.560660172, 5.5), (3.958578644, 2.897918472))
            ThreePointArc((3.958578644, 2.897918472), (3.915224093, 2.833033802), (3.9, 2.756497116))
        make_face(mode=Mode.SUBTRACT)
    extrude(amount=BOSS_EXTRUDE1_DEPTH)

    # Sketch2 → Cut-Extrude1 (cut, through all)
    with BuildSketch(Plane.XY.offset(200)):
        Circle(SKETCH2_R)
        with Locations(Location((20, 0, 0), (0, 0, 180))):
            Circle(SKETCH2_R)
    extrude(amount=-CUT_EXTRUDE1_DEPTH, mode=Mode.SUBTRACT)

    # Sketch3 → Cut-Extrude2 (cut)
    with BuildSketch(Plane(origin=(0, -10, 0), x_dir=(-1, 0, 0), z_dir=(0, -1, 0))):
        with Locations(Location((-10, -180, 0), (0, 0, 180))):
            Circle(SKETCH3_R)
        with Locations(Location((-10, -160, 0), (0, 0, 180))):
            Circle(SKETCH3_R)
    extrude(amount=-CUT_EXTRUDE2_DEPTH, mode=Mode.SUBTRACT)


solid = part.part
